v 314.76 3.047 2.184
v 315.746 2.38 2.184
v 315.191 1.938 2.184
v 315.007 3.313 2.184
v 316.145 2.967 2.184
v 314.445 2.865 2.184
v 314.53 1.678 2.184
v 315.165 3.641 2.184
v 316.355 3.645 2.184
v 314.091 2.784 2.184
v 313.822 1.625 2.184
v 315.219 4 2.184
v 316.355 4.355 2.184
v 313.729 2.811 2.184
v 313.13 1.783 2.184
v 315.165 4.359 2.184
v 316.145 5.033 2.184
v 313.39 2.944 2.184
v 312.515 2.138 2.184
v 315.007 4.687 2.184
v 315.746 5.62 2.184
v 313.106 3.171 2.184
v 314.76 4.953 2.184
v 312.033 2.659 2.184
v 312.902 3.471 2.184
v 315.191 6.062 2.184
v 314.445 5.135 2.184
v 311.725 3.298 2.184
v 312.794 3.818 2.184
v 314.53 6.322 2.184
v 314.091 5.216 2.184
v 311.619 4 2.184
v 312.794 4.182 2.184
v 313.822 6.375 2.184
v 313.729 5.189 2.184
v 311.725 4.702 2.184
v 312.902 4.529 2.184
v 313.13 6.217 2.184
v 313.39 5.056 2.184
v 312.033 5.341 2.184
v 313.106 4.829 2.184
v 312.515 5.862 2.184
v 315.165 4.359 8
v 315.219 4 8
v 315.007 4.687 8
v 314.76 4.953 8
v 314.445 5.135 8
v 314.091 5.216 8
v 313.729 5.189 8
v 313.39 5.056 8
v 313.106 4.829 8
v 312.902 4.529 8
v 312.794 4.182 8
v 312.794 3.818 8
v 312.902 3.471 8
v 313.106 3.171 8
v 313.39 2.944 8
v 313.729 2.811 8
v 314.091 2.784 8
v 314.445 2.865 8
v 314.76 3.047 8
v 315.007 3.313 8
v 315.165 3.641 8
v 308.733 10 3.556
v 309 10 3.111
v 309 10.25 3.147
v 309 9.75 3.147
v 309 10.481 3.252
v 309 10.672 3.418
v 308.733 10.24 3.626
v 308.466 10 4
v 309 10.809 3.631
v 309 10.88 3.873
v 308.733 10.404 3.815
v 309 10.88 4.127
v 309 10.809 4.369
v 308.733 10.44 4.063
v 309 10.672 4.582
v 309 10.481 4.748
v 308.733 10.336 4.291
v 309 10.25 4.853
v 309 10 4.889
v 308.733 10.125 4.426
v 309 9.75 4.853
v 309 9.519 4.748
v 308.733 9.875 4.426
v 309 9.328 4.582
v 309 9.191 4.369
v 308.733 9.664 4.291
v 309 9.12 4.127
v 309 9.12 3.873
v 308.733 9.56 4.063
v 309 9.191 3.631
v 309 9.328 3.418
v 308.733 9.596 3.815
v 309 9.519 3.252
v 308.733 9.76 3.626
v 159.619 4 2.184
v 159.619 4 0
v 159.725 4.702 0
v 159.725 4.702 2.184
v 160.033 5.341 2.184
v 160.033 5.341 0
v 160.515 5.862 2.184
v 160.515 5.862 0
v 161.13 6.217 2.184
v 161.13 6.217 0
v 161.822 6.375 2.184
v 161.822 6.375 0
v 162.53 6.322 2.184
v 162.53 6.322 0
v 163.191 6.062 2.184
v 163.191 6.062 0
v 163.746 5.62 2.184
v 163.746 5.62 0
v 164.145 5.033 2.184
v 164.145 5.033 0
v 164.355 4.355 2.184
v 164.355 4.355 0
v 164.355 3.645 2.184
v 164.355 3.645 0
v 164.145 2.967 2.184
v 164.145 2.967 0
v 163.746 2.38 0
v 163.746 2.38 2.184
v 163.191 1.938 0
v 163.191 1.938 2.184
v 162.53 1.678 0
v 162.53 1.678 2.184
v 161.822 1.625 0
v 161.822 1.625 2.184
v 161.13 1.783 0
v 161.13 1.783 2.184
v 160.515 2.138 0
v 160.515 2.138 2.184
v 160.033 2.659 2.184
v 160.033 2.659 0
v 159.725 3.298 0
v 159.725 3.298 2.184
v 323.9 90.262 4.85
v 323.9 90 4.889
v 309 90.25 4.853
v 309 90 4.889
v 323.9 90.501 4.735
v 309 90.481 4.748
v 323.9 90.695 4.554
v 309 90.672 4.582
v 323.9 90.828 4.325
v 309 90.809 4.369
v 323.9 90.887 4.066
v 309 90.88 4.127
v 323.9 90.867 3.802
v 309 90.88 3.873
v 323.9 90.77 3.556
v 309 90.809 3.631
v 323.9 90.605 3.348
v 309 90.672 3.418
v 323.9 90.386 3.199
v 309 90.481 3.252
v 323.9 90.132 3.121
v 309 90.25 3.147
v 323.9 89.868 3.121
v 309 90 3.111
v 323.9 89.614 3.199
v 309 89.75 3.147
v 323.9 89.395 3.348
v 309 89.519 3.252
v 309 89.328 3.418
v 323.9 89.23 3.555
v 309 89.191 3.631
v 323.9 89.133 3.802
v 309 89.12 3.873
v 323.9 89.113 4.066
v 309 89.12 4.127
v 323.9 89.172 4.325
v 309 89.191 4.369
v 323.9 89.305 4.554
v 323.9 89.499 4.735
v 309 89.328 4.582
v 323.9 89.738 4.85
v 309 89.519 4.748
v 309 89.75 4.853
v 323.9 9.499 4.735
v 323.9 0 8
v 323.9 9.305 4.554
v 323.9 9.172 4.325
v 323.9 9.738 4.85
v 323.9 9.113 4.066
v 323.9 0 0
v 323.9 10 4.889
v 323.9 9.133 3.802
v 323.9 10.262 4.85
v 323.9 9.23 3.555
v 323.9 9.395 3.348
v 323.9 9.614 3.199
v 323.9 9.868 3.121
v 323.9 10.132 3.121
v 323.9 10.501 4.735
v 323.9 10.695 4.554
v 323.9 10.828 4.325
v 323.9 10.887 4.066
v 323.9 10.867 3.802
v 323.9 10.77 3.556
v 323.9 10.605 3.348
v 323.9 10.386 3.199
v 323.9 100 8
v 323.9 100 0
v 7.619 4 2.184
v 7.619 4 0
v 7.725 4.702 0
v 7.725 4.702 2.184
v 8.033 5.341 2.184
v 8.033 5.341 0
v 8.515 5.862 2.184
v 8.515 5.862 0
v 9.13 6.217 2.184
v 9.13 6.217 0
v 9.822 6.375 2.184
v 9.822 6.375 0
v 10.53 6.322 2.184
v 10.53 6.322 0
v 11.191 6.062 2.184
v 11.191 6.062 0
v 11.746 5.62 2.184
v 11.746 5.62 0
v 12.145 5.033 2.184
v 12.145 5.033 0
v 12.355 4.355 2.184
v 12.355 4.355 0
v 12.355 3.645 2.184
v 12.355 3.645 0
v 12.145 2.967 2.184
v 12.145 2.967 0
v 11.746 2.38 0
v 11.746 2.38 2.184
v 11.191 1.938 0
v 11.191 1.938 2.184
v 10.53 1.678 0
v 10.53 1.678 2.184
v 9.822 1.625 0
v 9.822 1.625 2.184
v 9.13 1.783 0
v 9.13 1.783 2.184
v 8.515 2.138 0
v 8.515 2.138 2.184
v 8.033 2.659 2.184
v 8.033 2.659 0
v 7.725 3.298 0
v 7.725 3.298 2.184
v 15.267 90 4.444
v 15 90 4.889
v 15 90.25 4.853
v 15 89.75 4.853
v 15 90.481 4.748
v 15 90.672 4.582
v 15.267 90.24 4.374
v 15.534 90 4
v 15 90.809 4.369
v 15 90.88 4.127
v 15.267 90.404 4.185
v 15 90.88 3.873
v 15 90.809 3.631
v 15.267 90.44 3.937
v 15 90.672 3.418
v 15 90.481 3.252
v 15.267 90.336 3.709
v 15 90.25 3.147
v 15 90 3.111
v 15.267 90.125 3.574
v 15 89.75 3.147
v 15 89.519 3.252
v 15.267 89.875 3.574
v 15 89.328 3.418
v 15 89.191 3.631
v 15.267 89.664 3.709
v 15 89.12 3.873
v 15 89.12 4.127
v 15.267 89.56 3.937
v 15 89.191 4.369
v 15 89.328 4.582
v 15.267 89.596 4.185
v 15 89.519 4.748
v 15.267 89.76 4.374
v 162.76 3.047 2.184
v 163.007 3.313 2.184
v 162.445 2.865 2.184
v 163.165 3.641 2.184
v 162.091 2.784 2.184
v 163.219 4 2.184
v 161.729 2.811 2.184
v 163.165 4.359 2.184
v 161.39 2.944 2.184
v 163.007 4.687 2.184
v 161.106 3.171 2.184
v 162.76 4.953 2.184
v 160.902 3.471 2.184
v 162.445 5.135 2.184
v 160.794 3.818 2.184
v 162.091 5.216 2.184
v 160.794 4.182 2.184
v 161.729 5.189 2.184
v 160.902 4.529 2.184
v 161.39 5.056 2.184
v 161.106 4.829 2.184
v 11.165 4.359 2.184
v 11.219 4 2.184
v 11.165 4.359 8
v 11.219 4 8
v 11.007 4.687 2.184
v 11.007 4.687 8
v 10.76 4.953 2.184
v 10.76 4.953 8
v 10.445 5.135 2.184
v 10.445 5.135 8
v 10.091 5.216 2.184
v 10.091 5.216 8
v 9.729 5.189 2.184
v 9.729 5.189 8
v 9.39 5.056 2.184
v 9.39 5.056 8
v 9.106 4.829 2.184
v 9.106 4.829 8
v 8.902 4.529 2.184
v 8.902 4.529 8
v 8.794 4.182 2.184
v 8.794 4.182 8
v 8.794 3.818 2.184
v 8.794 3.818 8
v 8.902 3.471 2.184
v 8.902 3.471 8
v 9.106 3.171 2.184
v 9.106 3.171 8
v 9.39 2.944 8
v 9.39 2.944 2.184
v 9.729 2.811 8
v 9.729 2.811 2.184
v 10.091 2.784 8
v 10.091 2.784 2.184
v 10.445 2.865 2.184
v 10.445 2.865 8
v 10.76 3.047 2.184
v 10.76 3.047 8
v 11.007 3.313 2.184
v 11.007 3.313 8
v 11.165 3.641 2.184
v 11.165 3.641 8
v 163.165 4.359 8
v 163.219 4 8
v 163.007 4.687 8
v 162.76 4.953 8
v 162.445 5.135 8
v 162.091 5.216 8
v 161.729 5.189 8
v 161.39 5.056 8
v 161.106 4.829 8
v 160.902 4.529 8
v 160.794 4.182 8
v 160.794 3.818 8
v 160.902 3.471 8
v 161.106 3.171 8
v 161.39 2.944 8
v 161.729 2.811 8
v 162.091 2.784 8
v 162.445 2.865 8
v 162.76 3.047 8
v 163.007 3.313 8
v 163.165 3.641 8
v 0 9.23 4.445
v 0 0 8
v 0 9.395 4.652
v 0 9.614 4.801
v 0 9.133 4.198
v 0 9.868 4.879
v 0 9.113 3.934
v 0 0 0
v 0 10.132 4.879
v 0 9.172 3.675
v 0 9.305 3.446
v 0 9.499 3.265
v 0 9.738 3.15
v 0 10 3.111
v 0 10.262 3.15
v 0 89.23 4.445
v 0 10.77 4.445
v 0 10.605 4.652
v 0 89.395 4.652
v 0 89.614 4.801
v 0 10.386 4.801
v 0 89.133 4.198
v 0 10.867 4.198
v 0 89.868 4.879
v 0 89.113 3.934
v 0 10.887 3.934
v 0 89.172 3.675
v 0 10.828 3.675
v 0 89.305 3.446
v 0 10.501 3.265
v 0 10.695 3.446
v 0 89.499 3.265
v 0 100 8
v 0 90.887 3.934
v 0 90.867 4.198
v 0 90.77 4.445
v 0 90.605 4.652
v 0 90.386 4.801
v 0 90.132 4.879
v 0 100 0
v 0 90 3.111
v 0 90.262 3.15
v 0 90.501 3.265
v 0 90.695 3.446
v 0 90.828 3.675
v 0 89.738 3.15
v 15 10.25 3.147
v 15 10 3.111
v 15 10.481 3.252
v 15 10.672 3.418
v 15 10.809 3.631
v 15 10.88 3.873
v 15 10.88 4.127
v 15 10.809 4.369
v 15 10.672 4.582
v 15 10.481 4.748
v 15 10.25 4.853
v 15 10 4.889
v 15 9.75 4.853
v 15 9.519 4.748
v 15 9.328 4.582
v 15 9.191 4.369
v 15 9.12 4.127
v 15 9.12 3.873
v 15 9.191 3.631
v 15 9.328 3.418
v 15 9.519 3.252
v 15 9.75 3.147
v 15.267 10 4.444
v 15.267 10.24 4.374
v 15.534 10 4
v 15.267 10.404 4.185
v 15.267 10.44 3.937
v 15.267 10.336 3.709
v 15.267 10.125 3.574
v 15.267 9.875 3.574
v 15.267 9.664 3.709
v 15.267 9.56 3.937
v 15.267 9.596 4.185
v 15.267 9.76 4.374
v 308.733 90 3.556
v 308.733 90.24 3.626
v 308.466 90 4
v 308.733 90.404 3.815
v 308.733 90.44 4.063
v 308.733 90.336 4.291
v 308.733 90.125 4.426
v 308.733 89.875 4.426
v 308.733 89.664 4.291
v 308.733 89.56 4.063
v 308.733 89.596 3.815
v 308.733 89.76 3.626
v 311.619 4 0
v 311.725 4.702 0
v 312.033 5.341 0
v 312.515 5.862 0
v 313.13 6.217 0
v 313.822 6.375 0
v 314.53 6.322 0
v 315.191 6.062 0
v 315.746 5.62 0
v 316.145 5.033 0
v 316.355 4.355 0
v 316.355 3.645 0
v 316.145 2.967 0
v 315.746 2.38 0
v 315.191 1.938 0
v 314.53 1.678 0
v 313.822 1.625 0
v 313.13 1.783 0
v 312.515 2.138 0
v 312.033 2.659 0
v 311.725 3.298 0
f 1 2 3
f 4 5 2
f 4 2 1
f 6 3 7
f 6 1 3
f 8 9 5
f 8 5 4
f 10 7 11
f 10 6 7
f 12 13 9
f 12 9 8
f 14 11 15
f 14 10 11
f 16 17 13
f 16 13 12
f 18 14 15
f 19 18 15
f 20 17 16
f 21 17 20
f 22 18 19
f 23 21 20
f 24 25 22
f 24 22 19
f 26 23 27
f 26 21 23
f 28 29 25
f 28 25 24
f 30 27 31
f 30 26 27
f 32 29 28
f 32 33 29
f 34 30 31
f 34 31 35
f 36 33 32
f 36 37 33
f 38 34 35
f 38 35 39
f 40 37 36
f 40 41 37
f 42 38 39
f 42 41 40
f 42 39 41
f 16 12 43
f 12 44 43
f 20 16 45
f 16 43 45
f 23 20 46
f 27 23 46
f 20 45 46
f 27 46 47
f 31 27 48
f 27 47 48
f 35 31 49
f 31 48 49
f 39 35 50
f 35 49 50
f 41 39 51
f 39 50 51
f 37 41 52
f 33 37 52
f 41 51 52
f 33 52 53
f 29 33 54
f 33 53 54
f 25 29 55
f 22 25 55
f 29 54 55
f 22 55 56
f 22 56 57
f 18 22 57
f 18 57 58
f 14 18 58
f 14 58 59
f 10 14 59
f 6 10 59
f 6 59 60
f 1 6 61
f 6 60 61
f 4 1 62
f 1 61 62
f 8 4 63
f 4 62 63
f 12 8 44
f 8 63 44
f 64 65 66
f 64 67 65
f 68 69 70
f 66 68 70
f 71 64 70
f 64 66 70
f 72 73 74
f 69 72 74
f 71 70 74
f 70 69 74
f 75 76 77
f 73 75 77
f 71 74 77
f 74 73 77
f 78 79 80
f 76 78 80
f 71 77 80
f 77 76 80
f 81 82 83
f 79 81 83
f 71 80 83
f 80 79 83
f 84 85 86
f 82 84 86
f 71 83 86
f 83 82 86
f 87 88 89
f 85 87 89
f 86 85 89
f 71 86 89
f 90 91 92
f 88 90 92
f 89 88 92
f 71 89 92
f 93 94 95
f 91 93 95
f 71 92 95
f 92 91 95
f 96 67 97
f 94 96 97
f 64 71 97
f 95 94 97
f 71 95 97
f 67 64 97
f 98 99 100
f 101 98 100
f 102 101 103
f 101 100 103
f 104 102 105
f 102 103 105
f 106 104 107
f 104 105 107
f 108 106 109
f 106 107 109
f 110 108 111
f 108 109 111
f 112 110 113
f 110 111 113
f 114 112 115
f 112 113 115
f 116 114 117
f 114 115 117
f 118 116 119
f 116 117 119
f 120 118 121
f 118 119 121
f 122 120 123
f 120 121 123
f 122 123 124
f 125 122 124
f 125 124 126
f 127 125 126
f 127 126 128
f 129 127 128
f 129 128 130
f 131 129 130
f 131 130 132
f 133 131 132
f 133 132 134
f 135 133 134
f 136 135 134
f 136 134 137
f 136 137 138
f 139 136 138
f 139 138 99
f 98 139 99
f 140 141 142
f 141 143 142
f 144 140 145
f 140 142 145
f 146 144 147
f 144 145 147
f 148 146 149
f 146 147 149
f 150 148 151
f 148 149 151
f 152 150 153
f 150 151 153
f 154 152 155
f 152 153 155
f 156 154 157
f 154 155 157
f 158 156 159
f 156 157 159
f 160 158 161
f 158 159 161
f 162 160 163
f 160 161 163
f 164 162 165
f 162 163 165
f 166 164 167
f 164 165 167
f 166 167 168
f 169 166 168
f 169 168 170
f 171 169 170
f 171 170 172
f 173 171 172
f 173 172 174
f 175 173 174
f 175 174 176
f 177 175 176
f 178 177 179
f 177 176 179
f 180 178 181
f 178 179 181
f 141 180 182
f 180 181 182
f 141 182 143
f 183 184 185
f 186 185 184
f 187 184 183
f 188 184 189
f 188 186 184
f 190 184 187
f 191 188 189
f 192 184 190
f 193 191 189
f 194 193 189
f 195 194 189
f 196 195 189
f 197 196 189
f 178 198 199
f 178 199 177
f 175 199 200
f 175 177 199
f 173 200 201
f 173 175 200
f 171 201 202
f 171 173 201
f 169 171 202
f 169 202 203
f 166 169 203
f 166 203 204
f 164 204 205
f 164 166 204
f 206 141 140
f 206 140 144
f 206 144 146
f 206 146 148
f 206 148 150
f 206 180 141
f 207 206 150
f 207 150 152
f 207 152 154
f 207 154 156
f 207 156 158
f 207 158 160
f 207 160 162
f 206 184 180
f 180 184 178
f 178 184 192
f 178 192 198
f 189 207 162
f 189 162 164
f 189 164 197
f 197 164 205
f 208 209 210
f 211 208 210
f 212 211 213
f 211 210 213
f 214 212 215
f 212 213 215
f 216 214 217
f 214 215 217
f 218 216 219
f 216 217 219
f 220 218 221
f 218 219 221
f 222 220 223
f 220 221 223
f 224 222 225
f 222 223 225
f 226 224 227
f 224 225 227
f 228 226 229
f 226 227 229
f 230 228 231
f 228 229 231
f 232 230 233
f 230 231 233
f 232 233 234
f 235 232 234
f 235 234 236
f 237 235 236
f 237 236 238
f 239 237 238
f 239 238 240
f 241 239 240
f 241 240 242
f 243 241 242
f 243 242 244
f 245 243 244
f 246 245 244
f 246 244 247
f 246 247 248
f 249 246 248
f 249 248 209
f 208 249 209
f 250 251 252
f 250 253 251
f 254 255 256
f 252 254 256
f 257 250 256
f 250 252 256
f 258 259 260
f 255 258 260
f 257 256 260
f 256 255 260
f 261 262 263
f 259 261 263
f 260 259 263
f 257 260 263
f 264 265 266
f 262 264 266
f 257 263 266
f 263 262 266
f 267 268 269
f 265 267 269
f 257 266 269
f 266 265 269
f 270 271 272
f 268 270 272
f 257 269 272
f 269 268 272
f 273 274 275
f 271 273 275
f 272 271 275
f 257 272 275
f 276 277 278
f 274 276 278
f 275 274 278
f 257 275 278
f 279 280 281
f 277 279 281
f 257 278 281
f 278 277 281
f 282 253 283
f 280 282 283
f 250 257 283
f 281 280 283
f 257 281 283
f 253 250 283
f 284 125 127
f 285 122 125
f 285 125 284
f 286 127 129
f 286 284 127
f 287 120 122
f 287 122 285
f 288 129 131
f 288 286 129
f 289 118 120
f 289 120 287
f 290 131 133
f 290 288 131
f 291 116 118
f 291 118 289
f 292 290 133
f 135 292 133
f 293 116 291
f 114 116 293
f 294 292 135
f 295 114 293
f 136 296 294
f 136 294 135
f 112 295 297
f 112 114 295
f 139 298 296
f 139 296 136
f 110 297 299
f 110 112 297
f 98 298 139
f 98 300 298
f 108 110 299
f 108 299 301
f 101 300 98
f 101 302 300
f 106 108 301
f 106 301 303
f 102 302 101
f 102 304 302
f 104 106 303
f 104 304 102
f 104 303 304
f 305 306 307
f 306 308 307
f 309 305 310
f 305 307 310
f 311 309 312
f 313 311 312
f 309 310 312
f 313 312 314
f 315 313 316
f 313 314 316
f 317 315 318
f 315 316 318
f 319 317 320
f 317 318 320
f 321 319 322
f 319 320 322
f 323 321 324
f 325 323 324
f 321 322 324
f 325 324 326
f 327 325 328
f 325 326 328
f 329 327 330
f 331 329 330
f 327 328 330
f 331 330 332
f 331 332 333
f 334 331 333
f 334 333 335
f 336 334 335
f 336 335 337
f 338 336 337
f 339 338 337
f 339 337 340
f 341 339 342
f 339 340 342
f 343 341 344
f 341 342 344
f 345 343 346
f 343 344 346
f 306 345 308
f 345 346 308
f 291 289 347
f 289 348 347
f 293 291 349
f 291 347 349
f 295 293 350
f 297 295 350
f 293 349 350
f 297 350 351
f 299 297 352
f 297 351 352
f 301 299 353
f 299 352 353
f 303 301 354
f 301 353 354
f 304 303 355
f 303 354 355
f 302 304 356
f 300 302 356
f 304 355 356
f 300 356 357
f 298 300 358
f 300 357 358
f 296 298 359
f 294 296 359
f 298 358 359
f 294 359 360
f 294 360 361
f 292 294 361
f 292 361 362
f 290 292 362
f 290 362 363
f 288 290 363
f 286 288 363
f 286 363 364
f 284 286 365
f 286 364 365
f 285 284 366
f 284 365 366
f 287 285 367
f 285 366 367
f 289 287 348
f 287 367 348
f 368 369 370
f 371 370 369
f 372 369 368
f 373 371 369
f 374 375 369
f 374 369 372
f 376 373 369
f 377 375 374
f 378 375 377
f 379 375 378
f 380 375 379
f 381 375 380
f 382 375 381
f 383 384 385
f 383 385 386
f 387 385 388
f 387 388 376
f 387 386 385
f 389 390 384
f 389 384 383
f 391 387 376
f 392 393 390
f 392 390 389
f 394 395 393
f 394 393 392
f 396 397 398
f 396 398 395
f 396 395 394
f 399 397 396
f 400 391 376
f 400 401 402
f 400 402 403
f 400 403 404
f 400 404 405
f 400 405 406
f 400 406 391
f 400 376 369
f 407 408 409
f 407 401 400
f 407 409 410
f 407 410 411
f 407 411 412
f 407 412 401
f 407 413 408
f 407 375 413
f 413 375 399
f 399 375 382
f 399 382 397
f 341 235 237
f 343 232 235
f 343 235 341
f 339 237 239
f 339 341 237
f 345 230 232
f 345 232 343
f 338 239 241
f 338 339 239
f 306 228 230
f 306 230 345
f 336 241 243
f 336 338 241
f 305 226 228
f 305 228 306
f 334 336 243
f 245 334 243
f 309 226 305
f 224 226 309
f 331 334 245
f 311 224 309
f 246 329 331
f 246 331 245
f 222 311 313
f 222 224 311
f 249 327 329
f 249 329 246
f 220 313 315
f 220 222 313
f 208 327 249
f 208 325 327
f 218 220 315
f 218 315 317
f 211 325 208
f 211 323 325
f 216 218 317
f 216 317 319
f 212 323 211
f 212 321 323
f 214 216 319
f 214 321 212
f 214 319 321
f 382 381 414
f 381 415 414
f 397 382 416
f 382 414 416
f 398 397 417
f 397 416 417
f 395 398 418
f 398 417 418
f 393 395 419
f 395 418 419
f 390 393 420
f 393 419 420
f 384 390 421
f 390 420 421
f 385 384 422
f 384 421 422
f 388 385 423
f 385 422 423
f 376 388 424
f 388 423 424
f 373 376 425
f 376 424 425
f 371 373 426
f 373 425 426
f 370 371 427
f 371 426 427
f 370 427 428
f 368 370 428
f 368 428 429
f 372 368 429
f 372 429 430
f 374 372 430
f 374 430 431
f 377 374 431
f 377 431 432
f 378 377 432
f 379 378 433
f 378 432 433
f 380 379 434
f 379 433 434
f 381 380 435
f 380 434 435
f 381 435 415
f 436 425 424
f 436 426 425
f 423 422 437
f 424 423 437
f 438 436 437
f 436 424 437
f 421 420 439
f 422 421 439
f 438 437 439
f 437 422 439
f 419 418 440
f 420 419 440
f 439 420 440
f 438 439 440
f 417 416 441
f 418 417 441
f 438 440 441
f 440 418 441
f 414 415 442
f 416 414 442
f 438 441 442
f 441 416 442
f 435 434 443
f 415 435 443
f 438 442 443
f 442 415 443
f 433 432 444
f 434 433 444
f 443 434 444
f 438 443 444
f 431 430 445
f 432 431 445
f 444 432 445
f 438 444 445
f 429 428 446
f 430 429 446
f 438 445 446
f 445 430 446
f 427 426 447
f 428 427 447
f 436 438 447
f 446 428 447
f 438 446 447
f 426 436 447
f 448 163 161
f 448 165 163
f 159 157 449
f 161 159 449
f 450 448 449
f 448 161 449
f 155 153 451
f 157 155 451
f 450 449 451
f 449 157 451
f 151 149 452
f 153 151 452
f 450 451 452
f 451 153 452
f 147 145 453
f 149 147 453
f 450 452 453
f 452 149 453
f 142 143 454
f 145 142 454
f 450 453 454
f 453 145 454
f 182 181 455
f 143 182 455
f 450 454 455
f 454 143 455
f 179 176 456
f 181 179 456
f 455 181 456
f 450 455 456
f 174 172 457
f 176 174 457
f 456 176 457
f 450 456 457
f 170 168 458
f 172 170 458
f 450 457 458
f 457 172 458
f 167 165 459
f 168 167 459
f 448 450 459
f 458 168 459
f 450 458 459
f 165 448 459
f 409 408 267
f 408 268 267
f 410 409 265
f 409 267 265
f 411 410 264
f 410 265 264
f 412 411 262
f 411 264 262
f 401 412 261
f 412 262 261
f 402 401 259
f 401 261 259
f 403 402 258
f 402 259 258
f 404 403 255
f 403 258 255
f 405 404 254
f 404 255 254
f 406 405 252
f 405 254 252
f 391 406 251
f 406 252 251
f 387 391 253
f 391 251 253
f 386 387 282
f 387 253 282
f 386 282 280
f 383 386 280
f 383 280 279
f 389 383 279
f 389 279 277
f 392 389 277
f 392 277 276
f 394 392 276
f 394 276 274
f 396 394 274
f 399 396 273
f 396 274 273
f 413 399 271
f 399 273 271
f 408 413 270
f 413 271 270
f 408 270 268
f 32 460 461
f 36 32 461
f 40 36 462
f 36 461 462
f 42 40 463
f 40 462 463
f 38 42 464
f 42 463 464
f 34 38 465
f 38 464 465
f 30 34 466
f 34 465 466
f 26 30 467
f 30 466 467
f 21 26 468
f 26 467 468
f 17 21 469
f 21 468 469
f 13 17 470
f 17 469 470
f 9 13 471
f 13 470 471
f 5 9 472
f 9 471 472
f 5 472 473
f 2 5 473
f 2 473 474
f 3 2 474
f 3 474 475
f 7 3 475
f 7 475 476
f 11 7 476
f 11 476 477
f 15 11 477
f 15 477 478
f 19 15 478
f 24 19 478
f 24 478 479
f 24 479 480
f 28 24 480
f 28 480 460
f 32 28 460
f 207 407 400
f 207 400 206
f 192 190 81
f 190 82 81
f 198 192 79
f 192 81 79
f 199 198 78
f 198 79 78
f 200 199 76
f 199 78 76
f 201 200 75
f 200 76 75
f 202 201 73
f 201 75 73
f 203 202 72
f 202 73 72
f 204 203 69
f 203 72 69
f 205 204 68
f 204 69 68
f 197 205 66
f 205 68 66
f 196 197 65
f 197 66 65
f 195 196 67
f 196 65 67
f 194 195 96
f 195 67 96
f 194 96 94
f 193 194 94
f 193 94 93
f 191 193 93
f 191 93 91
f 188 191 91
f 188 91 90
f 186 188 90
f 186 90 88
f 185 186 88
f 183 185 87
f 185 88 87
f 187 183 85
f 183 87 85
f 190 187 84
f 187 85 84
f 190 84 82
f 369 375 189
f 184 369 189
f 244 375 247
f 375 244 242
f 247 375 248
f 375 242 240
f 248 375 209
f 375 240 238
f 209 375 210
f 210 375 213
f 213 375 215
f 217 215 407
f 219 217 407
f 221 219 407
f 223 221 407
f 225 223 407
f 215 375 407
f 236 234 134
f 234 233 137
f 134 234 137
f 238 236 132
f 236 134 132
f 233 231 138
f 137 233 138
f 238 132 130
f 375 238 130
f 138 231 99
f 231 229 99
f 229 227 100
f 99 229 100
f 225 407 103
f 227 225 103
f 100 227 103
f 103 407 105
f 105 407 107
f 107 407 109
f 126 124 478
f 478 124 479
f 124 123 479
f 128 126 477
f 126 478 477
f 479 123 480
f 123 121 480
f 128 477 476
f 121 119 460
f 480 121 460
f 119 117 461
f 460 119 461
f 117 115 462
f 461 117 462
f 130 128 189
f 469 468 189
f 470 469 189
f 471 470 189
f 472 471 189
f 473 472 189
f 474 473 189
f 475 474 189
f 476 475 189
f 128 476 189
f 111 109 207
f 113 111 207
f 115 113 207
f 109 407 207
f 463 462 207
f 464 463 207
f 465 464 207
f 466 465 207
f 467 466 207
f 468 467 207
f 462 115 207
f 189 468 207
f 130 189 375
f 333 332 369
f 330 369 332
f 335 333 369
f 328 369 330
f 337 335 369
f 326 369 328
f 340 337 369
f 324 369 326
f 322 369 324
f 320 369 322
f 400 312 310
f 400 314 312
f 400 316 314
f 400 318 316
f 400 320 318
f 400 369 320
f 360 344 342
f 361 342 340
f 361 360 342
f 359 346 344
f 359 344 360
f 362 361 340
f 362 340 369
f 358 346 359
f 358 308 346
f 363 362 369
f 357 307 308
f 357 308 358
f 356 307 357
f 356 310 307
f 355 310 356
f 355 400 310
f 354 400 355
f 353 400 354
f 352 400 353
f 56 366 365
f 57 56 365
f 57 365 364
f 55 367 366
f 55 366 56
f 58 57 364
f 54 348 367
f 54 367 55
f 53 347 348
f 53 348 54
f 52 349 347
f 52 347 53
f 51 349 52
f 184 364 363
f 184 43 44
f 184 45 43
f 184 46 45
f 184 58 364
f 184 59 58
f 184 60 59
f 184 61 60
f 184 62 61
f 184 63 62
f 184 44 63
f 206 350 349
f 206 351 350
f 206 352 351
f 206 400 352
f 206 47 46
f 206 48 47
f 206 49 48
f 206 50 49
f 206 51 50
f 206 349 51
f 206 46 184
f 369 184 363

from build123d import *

# Parameters (mm, degrees)
SKETCH1_W                                      = 324
SKETCH1_H                                      = 100
BOSS_EXTRUDE1_DEPTH                            = 8
CBORE_FOR_2_SOCKET_HEAD_CAP_SCREW1_D           = 2.4384
CBORE_FOR_2_SOCKET_HEAD_CAP_SCREW1_CBORE_D     = 4.7625
CBORE_FOR_2_SOCKET_HEAD_CAP_SCREW1_CBORE_DEPTH = 2.1844
F_2_56_TAPPED_HOLE1_D                          = 1.778
F_2_56_TAPPED_HOLE1_DEPTH                      = 15
F_2_56_TAPPED_HOLE1_TIP                        = 0.53416509
F_2_56_TAPPED_HOLE2_D                          = 1.778
F_2_56_TAPPED_HOLE2_DEPTH                      = 15
F_2_56_TAPPED_HOLE2_TIP                        = 0.53416509
SKETCH10_W                                     = 8
SKETCH10_H                                     = 100
CUT_EXTRUDE1_DEPTH                             = 0.1


with BuildPart() as part:
    # Sketch1 → Boss-Extrude1 (new body)
    with BuildSketch(Plane.XY):
        with Locations((162, 50)):
            Rectangle(SKETCH1_W, SKETCH1_H)
    extrude(amount=BOSS_EXTRUDE1_DEPTH)

    # CBORE for #2 Socket Head Cap Screw1 (through all)
    with Locations(Plane(origin=(0, 0, 0), x_dir=(-1, 0, 0), z_dir=(0, 0, -1))):
        with Locations((-314, 4), (-10, 4), (-162, 4)):
            CounterBoreHole(CBORE_FOR_2_SOCKET_HEAD_CAP_SCREW1_D / 2, CBORE_FOR_2_SOCKET_HEAD_CAP_SCREW1_CBORE_D / 2, CBORE_FOR_2_SOCKET_HEAD_CAP_SCREW1_CBORE_DEPTH)

    # #2-56 Tapped Hole1
    with Locations(Plane(origin=(324, 0, 0), x_dir=(0, 0, -1), z_dir=(1, 0, 0))):
        with Locations((-4, 90), (-4, 10)):
            Hole(F_2_56_TAPPED_HOLE1_D / 2, depth=F_2_56_TAPPED_HOLE1_DEPTH)
            with Locations((0, 0, -(F_2_56_TAPPED_HOLE1_DEPTH + F_2_56_TAPPED_HOLE1_TIP / 2))):  # 118° drill point
                Cone(0, F_2_56_TAPPED_HOLE1_D / 2, F_2_56_TAPPED_HOLE1_TIP, mode=Mode.SUBTRACT)

    # #2-56 Tapped Hole2
    with Locations(Plane.ZY):
        with Locations((4, 90), (4, 10)):
            Hole(F_2_56_TAPPED_HOLE2_D / 2, depth=F_2_56_TAPPED_HOLE2_DEPTH)
            with Locations((0, 0, -(F_2_56_TAPPED_HOLE2_DEPTH + F_2_56_TAPPED_HOLE2_TIP / 2))):  # 118° drill point
                Cone(0, F_2_56_TAPPED_HOLE2_D / 2, F_2_56_TAPPED_HOLE2_TIP, mode=Mode.SUBTRACT)

    # Sketch10 → Cut-Extrude1 (cut)
    with BuildSketch(Plane(origin=(324, 0, 0), x_dir=(0, 0, -1), z_dir=(1, 0, 0))):
        with Locations((-4, 50)):
            Rectangle(SKETCH10_W, SKETCH10_H)
    extrude(amount=-CUT_EXTRUDE1_DEPTH, mode=Mode.SUBTRACT)


solid = part.part
